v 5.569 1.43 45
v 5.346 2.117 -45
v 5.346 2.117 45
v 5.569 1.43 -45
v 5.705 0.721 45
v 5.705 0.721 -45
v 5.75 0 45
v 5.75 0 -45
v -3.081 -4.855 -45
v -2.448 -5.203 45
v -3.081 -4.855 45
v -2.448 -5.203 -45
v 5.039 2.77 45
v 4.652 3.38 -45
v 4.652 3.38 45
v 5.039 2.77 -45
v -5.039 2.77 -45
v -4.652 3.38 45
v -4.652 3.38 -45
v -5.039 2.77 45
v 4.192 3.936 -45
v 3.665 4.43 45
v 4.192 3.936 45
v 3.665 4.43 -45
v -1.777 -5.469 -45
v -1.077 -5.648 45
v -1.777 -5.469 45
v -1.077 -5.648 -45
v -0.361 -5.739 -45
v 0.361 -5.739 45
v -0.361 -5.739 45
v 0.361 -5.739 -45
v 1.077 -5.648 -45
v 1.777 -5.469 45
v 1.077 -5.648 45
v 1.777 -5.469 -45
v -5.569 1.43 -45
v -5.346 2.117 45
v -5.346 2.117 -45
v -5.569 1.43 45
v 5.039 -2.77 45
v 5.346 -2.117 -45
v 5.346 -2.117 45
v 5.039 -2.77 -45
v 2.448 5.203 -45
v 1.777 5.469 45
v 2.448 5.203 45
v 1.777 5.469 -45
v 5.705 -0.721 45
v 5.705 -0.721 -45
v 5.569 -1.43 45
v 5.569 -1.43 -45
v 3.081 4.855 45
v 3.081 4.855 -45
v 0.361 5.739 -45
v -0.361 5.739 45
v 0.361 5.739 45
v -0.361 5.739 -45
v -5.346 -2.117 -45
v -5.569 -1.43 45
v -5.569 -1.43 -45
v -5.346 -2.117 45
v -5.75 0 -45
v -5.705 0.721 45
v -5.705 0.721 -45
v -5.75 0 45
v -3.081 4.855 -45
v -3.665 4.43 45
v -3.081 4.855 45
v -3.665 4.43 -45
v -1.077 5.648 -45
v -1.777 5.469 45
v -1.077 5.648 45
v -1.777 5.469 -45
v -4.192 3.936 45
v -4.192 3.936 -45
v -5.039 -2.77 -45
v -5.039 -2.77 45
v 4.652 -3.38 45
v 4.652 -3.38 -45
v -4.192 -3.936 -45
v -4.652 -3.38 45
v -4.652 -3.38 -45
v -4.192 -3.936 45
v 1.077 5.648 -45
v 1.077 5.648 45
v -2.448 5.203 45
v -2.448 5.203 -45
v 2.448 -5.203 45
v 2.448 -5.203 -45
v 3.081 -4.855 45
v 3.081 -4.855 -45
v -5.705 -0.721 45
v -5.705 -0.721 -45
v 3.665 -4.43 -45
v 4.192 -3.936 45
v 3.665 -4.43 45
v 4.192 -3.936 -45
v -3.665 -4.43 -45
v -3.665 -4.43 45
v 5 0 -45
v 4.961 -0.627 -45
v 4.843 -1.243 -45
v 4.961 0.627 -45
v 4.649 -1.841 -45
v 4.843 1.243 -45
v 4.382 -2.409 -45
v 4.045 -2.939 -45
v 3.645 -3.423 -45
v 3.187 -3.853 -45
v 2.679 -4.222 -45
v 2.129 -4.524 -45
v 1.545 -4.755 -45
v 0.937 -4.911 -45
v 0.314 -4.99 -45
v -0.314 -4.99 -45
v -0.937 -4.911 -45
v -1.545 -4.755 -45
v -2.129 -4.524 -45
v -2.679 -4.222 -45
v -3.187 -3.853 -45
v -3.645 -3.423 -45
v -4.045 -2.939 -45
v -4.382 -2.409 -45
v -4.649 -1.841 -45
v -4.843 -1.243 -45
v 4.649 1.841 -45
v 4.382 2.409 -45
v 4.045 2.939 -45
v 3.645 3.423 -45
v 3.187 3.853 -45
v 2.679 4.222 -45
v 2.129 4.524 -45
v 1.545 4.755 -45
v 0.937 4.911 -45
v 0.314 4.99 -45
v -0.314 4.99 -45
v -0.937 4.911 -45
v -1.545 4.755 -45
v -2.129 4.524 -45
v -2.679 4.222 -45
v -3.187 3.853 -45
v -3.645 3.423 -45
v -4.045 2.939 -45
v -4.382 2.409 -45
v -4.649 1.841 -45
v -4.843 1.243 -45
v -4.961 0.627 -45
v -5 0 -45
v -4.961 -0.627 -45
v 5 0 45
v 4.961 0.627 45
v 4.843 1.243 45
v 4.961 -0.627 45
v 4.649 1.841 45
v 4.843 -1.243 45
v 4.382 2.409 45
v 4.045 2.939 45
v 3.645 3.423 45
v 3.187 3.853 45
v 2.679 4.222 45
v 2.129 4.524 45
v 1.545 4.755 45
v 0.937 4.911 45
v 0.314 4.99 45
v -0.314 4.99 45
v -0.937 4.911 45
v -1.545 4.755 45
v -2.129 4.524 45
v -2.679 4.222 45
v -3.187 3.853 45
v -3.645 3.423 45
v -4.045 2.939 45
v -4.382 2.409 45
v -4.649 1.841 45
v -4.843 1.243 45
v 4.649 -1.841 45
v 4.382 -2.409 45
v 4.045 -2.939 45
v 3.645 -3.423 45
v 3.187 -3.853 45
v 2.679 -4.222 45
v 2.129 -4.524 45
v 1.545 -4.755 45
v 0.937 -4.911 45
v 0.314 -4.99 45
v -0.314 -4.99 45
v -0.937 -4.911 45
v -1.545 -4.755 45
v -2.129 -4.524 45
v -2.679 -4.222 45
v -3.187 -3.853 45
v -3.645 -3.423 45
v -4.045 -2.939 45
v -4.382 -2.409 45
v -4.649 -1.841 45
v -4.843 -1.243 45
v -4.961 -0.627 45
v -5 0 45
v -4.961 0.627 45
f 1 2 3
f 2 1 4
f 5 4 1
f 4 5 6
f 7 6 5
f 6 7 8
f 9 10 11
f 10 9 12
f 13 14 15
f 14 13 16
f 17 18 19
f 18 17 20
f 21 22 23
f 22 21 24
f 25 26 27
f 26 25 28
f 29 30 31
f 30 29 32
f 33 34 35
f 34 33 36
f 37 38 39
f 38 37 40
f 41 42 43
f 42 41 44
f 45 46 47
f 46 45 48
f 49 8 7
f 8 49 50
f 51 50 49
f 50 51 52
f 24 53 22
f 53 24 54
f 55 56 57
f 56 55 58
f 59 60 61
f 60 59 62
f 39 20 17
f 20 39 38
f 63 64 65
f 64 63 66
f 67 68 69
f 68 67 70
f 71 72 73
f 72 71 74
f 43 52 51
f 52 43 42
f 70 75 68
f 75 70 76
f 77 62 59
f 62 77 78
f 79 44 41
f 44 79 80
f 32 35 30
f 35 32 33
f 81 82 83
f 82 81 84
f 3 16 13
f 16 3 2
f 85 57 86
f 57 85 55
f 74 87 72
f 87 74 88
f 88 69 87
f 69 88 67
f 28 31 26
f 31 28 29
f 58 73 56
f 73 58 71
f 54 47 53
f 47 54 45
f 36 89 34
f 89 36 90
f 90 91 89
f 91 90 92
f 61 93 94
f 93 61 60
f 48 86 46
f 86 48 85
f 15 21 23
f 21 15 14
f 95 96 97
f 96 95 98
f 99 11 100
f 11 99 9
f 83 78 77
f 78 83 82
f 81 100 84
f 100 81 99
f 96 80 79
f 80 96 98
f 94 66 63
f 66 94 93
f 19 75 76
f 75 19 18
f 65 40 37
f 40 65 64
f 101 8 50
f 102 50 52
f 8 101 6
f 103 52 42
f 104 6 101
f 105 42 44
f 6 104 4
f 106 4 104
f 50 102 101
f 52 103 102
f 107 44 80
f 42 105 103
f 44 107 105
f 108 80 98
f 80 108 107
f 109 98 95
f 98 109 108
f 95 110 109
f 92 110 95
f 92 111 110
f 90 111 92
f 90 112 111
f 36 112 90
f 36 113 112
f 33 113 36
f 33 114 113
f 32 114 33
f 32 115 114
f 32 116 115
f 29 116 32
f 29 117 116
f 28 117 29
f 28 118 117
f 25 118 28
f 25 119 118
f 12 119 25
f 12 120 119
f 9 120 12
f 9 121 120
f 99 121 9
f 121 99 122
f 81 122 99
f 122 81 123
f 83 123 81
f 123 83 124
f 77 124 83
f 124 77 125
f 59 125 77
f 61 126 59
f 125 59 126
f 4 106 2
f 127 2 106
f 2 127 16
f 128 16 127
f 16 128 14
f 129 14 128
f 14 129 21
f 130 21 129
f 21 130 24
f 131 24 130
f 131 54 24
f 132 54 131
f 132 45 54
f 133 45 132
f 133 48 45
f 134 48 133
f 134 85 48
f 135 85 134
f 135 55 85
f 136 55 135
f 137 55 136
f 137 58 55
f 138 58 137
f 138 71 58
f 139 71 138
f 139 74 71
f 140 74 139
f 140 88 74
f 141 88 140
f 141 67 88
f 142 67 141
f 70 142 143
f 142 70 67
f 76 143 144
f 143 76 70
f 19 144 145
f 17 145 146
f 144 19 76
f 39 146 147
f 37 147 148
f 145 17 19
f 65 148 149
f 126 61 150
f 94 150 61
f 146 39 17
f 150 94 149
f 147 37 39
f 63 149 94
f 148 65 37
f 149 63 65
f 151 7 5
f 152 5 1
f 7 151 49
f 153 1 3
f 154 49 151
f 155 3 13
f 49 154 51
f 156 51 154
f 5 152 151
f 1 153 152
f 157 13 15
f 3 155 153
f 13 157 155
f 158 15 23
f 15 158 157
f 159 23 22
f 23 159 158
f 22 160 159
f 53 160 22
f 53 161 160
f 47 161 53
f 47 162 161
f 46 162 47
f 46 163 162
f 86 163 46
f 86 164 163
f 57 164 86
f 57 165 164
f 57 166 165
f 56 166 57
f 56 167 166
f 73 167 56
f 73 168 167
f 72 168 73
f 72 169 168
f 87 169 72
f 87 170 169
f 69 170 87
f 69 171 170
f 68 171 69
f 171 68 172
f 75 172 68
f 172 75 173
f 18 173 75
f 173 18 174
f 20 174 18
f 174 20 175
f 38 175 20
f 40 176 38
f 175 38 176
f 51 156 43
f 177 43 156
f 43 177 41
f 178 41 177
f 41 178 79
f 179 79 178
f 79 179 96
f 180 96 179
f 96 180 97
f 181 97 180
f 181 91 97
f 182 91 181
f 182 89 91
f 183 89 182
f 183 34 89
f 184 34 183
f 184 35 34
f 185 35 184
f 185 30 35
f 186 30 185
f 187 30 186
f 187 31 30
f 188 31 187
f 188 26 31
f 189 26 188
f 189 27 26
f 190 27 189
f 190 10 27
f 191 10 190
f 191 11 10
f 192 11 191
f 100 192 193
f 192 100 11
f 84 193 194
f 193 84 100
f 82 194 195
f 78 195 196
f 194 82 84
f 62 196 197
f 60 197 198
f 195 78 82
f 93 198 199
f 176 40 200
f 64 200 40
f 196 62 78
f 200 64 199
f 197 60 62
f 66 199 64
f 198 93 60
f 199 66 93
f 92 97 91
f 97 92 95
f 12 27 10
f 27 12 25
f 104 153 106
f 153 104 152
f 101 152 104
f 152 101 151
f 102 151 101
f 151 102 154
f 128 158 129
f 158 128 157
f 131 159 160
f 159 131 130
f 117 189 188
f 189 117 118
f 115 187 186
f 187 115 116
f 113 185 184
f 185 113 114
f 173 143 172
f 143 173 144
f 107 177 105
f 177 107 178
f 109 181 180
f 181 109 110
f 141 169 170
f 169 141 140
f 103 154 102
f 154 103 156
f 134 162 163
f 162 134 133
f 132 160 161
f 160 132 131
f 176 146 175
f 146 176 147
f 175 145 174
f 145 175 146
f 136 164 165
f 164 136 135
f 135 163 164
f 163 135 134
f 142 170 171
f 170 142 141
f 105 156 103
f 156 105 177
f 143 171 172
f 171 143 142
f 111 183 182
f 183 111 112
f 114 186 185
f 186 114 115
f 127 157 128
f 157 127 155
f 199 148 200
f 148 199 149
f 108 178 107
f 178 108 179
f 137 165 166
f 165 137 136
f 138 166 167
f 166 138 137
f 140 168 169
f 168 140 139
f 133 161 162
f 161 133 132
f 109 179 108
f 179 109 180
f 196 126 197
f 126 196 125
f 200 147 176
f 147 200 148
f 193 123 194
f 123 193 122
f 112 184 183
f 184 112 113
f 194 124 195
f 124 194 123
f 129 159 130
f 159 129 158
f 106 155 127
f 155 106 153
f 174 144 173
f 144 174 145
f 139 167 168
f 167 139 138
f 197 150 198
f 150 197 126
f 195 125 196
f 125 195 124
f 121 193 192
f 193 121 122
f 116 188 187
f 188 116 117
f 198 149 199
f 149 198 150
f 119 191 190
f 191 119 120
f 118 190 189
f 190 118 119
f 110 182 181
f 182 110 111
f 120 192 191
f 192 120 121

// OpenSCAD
$fn = 50;


difference() {
	union() {
		translate(v = [0, 0, -45.0000000000]) {
			cylinder(h = 90, r = 5.7500000000);
		}
	}
	union() {
		translate(v = [0, 0, -100.0000000000]) {
			cylinder(h = 200, r = 5.0000000000);
		}
	}
}
